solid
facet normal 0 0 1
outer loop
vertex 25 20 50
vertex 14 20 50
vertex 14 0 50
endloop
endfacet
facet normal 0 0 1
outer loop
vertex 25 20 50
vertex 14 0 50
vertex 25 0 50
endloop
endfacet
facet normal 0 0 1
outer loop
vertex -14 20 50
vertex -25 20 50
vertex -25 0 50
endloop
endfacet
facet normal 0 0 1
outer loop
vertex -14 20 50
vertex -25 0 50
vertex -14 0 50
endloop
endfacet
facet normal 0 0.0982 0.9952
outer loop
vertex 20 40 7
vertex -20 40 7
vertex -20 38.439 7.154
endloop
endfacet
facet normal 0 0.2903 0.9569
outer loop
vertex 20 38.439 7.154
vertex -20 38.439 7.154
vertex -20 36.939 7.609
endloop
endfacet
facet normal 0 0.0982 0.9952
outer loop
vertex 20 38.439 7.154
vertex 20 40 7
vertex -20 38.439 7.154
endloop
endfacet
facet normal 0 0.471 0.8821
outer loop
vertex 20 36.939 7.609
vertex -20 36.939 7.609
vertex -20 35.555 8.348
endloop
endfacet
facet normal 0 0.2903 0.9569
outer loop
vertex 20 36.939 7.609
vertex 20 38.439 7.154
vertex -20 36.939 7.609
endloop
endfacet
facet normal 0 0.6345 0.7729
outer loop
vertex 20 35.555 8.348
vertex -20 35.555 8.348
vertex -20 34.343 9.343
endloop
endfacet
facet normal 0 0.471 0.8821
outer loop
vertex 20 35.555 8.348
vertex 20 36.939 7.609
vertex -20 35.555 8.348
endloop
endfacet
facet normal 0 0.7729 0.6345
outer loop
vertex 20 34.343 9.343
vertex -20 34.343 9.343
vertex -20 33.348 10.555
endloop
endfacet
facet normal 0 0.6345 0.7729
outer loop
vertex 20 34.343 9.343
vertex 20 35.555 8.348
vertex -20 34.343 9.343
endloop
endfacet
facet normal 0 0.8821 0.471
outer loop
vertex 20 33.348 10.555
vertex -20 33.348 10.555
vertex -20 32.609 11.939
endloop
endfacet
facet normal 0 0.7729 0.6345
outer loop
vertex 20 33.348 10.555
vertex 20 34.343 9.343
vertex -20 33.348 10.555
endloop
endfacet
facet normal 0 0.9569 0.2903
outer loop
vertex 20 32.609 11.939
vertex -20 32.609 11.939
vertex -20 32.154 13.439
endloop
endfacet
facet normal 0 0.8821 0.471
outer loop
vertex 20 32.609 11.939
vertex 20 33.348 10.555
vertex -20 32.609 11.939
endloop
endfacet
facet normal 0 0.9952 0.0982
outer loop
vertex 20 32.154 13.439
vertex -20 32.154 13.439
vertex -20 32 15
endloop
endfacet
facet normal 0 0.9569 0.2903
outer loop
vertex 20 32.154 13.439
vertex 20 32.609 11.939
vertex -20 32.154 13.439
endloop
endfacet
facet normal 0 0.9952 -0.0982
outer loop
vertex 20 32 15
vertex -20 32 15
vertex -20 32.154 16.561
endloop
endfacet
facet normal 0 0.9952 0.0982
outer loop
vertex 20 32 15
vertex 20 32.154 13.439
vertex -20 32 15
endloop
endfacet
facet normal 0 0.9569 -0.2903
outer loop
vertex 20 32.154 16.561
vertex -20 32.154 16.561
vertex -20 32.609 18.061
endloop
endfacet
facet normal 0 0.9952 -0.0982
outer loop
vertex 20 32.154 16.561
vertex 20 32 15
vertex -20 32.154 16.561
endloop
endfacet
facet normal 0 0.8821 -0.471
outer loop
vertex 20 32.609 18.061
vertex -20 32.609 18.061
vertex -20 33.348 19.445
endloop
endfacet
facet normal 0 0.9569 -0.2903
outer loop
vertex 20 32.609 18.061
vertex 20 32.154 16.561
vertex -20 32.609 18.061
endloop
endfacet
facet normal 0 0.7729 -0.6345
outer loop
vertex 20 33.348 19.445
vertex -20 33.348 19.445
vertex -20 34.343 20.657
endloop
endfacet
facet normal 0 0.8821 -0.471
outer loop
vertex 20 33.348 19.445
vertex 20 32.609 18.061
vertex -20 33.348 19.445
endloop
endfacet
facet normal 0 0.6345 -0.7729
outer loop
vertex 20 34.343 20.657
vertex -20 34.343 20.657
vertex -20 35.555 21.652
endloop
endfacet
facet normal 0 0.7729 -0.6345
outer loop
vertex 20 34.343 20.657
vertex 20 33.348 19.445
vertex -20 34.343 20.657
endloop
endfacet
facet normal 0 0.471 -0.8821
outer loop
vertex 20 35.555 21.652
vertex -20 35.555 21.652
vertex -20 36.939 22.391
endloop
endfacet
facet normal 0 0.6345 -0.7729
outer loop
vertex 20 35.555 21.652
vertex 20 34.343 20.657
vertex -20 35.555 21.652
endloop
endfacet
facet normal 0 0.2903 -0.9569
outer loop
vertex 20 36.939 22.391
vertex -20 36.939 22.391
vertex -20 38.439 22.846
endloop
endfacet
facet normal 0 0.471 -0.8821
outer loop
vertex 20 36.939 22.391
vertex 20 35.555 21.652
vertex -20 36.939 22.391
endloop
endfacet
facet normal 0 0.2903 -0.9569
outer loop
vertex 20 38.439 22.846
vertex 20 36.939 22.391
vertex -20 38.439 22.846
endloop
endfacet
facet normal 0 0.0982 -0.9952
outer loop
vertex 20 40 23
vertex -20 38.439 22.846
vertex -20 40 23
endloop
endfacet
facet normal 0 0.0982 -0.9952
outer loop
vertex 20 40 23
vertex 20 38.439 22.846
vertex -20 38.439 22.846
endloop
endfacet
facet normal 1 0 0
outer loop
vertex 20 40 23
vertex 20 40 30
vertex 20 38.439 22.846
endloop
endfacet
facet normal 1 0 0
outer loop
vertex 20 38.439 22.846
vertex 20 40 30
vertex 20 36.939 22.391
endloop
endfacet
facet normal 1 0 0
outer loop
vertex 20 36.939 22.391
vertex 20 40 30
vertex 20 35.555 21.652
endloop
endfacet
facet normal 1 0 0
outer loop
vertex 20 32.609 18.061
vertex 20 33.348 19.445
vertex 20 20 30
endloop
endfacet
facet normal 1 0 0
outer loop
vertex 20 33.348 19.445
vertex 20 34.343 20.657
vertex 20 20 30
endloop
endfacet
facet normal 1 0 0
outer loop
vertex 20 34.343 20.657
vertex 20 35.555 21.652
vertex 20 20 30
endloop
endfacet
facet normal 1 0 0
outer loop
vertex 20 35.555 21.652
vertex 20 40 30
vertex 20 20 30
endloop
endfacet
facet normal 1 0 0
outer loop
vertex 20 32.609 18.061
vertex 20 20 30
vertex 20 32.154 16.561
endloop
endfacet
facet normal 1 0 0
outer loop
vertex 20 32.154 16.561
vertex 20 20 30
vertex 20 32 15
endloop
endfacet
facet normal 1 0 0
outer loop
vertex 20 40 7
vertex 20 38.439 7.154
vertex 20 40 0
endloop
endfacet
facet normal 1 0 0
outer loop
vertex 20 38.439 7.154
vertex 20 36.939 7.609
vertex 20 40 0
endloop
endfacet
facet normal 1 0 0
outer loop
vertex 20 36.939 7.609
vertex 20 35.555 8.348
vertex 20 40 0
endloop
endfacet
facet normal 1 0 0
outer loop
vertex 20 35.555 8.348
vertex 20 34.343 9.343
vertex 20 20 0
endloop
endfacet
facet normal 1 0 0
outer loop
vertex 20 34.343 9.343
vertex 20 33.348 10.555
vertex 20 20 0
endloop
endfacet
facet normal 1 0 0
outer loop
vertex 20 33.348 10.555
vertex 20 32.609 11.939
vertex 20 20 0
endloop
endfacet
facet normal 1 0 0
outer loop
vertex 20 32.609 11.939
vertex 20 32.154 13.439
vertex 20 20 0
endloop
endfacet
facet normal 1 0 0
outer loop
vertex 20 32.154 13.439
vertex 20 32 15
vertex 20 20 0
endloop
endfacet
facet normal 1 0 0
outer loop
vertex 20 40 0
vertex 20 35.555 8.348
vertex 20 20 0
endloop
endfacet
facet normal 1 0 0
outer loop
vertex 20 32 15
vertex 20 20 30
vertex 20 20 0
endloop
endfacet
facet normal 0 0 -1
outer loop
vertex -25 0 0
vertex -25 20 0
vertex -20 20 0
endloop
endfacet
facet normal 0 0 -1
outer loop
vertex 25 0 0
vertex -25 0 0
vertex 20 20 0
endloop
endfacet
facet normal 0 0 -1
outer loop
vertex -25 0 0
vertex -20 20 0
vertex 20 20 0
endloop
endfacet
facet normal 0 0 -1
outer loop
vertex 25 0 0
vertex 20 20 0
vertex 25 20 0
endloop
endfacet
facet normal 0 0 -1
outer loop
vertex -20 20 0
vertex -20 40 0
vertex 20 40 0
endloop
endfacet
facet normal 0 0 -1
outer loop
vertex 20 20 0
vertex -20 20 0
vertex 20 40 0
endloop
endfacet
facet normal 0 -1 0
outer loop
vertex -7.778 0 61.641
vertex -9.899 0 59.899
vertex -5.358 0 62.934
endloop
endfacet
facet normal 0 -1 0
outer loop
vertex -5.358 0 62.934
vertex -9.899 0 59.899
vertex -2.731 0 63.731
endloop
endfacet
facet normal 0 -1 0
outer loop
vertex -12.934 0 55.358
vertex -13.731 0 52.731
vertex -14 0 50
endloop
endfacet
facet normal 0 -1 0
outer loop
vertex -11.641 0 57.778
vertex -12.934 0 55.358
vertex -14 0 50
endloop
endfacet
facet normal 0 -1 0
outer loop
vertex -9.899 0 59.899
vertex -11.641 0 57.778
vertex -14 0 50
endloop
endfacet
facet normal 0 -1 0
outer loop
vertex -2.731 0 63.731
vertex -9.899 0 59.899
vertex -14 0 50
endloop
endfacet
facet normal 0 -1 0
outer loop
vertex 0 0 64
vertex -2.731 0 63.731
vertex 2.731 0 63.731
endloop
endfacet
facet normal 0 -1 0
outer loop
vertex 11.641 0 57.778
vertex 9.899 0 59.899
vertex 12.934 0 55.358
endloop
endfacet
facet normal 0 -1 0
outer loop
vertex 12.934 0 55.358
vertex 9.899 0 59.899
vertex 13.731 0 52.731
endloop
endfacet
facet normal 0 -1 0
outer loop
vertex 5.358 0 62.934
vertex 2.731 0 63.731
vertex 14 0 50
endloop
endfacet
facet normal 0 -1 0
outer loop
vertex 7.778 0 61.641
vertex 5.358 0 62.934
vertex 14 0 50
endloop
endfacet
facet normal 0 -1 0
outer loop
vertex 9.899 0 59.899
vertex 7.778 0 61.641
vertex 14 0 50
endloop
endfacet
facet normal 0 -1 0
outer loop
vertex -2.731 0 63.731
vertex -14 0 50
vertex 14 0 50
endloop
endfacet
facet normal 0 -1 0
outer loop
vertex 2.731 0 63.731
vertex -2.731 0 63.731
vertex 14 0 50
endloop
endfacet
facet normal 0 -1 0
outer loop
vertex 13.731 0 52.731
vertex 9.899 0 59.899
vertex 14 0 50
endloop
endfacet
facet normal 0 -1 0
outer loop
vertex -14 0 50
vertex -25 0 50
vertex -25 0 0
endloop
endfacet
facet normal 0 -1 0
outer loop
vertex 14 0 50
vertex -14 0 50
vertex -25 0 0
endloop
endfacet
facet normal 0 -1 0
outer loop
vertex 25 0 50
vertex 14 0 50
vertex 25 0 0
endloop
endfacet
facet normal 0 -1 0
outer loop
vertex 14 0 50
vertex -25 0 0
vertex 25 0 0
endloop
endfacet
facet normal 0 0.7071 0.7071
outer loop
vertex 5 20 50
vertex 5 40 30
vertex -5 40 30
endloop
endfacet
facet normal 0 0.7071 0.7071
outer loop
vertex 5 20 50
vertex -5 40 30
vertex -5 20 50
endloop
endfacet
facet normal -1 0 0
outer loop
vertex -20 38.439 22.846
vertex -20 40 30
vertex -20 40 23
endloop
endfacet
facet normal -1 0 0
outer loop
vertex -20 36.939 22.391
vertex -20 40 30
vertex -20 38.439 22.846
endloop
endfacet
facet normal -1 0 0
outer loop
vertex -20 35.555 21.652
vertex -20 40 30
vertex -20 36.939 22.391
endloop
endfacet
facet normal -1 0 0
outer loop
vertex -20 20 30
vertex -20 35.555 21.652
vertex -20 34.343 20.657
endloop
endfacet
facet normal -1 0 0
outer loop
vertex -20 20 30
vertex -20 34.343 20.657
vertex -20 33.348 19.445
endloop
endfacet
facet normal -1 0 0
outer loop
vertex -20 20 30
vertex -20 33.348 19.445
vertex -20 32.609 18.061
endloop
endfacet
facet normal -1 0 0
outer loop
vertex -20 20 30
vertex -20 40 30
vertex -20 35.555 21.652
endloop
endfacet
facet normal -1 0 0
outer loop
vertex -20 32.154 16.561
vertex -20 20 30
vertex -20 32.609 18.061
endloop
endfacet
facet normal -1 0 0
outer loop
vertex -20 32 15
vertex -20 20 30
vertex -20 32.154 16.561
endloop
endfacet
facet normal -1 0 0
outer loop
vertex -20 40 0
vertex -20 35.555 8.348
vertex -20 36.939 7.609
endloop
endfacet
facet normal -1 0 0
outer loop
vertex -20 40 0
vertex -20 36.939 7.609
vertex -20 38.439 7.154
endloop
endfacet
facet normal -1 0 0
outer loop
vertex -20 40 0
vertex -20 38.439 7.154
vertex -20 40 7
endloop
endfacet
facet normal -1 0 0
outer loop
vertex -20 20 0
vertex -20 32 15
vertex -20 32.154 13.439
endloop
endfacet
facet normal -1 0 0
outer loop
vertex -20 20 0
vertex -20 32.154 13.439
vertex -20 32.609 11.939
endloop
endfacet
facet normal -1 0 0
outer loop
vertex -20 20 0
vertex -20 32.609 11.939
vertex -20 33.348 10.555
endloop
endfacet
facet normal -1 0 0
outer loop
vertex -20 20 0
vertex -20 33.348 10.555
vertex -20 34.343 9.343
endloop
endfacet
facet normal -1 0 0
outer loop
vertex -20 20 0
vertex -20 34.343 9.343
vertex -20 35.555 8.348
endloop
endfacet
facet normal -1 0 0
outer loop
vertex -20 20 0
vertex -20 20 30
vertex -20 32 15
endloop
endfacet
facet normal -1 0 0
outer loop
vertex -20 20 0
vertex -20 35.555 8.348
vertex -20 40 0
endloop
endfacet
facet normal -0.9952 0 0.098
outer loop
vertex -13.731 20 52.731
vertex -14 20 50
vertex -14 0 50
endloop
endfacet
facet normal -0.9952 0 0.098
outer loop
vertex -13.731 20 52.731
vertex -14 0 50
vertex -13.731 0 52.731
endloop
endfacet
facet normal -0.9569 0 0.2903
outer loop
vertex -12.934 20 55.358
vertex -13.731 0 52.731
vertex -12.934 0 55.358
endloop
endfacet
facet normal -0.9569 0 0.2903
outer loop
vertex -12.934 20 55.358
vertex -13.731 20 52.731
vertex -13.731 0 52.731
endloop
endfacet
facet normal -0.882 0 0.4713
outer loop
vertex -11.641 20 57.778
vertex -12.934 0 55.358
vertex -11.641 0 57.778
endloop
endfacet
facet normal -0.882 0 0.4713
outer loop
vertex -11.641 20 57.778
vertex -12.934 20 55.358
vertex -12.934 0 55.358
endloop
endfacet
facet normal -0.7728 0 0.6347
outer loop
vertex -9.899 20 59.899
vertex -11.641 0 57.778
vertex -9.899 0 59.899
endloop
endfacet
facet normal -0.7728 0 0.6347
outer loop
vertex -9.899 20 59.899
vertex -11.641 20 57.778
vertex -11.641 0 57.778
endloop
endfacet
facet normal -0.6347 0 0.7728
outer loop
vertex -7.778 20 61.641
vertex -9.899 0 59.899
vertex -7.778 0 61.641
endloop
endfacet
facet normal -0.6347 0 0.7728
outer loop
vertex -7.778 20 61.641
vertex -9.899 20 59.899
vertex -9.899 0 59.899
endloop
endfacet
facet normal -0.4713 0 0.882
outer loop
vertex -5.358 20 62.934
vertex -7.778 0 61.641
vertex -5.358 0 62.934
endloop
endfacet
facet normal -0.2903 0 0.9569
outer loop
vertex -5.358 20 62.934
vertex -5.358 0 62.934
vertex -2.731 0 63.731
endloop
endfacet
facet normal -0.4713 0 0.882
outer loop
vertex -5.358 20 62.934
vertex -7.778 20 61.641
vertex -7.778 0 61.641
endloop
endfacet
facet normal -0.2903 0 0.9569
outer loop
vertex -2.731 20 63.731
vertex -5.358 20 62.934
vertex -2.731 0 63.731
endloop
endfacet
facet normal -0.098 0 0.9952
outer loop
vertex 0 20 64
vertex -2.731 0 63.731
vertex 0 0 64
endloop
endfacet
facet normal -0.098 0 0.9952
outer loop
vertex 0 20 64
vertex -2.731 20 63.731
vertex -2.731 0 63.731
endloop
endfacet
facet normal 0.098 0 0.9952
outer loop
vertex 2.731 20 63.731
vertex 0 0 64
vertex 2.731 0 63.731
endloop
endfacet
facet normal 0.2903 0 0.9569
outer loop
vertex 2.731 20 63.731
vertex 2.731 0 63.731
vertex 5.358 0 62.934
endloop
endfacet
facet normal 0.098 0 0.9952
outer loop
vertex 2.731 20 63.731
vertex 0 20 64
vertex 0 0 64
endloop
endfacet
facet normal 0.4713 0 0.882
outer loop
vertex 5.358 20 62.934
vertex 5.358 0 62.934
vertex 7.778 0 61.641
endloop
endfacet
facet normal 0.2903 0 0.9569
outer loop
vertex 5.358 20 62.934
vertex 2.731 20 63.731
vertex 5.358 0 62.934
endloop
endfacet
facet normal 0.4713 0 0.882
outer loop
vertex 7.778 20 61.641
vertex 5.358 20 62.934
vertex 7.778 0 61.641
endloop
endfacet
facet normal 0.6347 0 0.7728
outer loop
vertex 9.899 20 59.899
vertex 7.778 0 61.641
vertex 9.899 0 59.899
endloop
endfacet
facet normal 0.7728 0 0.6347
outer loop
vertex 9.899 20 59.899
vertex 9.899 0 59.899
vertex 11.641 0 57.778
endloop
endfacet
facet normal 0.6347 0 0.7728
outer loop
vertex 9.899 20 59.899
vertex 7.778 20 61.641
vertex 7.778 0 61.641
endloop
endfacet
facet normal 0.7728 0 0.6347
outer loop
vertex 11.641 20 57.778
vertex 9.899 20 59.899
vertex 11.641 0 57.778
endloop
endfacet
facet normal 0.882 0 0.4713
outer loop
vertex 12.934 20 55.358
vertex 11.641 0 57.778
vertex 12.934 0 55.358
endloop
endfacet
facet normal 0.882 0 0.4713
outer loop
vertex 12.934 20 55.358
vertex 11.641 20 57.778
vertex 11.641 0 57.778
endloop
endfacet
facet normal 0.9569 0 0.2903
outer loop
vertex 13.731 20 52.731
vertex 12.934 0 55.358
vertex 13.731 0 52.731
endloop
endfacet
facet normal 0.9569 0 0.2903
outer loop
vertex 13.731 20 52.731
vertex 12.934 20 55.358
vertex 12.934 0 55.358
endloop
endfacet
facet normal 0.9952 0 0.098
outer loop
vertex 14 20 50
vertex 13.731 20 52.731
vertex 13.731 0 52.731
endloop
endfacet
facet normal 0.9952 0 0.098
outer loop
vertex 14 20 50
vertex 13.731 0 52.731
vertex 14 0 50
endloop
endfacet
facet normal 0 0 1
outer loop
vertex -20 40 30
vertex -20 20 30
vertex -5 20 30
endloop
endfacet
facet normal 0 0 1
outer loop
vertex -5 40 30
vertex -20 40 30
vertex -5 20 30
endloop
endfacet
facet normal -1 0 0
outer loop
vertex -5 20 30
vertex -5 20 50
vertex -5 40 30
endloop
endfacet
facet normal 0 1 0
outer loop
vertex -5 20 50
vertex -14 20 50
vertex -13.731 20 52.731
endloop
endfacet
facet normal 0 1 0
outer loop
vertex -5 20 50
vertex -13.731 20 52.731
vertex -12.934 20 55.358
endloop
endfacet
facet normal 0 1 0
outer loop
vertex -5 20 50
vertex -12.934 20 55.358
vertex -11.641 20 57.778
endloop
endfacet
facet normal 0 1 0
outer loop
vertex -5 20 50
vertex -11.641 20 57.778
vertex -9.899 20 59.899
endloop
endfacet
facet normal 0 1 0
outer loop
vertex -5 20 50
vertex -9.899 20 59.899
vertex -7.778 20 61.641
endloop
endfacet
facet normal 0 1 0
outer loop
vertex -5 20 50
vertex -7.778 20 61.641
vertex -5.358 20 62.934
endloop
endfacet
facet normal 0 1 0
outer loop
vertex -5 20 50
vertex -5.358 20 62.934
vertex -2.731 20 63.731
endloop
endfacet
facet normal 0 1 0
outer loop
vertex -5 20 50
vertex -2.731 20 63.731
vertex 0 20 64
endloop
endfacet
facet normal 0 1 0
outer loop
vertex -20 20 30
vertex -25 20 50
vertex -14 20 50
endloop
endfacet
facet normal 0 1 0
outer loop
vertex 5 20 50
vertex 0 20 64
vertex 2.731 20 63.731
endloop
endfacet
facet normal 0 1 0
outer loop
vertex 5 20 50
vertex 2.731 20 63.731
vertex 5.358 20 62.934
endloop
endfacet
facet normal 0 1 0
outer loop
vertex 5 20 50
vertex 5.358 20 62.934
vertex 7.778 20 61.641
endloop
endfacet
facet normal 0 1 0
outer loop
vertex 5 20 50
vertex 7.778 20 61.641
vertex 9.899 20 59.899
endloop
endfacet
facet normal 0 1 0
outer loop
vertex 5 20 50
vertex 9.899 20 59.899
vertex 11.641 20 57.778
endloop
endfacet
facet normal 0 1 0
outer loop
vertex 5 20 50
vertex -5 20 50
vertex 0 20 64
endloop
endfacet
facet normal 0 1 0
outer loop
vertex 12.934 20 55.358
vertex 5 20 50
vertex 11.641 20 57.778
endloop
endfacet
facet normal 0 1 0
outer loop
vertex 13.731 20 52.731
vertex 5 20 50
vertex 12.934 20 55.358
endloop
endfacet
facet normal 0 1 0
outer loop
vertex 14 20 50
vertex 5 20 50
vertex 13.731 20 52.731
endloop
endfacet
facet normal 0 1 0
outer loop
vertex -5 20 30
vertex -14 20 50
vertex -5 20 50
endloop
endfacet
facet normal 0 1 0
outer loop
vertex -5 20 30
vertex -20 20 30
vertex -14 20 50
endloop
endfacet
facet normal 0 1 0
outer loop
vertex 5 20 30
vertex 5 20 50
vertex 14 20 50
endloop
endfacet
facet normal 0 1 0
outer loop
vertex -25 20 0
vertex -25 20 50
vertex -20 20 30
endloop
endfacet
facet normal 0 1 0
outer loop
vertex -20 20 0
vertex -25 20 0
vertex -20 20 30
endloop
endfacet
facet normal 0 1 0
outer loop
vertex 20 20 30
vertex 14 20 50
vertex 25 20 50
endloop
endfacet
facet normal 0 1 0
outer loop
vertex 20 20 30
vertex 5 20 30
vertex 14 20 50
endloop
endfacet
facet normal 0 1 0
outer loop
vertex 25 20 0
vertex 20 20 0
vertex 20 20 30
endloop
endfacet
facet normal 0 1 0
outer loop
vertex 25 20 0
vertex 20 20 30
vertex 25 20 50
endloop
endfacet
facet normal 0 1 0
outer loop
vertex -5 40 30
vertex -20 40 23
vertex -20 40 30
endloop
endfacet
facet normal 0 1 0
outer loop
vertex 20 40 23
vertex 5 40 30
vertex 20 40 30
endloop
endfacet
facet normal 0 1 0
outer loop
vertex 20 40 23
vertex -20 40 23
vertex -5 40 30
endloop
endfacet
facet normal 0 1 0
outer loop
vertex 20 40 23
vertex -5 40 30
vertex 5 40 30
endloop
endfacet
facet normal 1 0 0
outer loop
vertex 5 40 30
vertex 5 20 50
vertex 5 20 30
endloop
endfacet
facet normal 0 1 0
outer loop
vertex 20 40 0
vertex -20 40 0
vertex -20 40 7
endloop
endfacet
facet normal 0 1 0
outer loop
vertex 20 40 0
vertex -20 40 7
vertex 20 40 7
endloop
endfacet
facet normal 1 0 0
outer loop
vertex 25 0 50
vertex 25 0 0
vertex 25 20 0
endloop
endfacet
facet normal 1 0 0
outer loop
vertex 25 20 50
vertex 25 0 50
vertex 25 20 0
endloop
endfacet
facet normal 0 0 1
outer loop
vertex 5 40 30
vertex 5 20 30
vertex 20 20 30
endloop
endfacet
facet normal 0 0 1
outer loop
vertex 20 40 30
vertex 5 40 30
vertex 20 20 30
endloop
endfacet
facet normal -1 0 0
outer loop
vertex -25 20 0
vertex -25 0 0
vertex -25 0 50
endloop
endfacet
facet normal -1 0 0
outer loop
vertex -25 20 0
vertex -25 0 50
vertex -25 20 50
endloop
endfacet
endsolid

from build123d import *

# Parameters (mm, degrees)
SKETCH1_W           = 50
SKETCH1_H           = 20
BOSS_EXTRUDE1_DEPTH = 50
SKETCH2_W           = 40
SKETCH2_H           = 30
BOSS_EXTRUDE2_DEPTH = 20
CUT_EXTRUDE1_DEPTH  = 79.262379212
BOSS_EXTRUDE3_DEPTH = 20
BOSS_EXTRUDE4_DEPTH = 5


with BuildPart() as part:
    # Sketch1 → Boss-Extrude1 (new body)
    with BuildSketch(Plane.XY):
        with Locations((0, 10)):
            Rectangle(SKETCH1_W, SKETCH1_H)
    extrude(amount=BOSS_EXTRUDE1_DEPTH)

    # Sketch2 → Boss-Extrude2 (add)
    with BuildSketch(Plane(origin=(0, 20, 0), x_dir=(1, 0, 0), z_dir=(0, 1, 0))):
        with Locations((0, -15)):
            Rectangle(SKETCH2_W, SKETCH2_H)
    extrude(amount=BOSS_EXTRUDE2_DEPTH)

    # Sketch3 → Cut-Extrude1 (cut, through all)
    with BuildSketch(Plane(origin=(20, 0, 0), x_dir=(0, 0, -1), z_dir=(1, 0, 0))):
        with BuildLine():
            Line((-23, 40), (-7, 40))
            ThreePointArc((-7, 40), (-15, 32), (-23, 40))
        make_face()
    extrude(amount=-CUT_EXTRUDE1_DEPTH, mode=Mode.SUBTRACT)

    # Sketch4 → Boss-Extrude3 (add)
    with BuildSketch(Plane(origin=(0, 20, 0), x_dir=(1, 0, 0), z_dir=(0, 1, 0))):
        with BuildLine():
            Line((14, -50), (-14, -50))
            ThreePointArc((-14, -50), (0, -64), (14, -50))
        make_face()
    extrude(amount=-BOSS_EXTRUDE3_DEPTH)

    # Sketch5 → Boss-Extrude4 (add, symmetric)
    with BuildSketch(Plane(origin=(0, 0, 0), x_dir=(0, 0, -1), z_dir=(1, 0, 0))):
        Polygon((-30, 20), (-30, 40), (-50, 20), align=None)
    extrude(amount=BOSS_EXTRUDE4_DEPTH, both=True)


solid = part.part
